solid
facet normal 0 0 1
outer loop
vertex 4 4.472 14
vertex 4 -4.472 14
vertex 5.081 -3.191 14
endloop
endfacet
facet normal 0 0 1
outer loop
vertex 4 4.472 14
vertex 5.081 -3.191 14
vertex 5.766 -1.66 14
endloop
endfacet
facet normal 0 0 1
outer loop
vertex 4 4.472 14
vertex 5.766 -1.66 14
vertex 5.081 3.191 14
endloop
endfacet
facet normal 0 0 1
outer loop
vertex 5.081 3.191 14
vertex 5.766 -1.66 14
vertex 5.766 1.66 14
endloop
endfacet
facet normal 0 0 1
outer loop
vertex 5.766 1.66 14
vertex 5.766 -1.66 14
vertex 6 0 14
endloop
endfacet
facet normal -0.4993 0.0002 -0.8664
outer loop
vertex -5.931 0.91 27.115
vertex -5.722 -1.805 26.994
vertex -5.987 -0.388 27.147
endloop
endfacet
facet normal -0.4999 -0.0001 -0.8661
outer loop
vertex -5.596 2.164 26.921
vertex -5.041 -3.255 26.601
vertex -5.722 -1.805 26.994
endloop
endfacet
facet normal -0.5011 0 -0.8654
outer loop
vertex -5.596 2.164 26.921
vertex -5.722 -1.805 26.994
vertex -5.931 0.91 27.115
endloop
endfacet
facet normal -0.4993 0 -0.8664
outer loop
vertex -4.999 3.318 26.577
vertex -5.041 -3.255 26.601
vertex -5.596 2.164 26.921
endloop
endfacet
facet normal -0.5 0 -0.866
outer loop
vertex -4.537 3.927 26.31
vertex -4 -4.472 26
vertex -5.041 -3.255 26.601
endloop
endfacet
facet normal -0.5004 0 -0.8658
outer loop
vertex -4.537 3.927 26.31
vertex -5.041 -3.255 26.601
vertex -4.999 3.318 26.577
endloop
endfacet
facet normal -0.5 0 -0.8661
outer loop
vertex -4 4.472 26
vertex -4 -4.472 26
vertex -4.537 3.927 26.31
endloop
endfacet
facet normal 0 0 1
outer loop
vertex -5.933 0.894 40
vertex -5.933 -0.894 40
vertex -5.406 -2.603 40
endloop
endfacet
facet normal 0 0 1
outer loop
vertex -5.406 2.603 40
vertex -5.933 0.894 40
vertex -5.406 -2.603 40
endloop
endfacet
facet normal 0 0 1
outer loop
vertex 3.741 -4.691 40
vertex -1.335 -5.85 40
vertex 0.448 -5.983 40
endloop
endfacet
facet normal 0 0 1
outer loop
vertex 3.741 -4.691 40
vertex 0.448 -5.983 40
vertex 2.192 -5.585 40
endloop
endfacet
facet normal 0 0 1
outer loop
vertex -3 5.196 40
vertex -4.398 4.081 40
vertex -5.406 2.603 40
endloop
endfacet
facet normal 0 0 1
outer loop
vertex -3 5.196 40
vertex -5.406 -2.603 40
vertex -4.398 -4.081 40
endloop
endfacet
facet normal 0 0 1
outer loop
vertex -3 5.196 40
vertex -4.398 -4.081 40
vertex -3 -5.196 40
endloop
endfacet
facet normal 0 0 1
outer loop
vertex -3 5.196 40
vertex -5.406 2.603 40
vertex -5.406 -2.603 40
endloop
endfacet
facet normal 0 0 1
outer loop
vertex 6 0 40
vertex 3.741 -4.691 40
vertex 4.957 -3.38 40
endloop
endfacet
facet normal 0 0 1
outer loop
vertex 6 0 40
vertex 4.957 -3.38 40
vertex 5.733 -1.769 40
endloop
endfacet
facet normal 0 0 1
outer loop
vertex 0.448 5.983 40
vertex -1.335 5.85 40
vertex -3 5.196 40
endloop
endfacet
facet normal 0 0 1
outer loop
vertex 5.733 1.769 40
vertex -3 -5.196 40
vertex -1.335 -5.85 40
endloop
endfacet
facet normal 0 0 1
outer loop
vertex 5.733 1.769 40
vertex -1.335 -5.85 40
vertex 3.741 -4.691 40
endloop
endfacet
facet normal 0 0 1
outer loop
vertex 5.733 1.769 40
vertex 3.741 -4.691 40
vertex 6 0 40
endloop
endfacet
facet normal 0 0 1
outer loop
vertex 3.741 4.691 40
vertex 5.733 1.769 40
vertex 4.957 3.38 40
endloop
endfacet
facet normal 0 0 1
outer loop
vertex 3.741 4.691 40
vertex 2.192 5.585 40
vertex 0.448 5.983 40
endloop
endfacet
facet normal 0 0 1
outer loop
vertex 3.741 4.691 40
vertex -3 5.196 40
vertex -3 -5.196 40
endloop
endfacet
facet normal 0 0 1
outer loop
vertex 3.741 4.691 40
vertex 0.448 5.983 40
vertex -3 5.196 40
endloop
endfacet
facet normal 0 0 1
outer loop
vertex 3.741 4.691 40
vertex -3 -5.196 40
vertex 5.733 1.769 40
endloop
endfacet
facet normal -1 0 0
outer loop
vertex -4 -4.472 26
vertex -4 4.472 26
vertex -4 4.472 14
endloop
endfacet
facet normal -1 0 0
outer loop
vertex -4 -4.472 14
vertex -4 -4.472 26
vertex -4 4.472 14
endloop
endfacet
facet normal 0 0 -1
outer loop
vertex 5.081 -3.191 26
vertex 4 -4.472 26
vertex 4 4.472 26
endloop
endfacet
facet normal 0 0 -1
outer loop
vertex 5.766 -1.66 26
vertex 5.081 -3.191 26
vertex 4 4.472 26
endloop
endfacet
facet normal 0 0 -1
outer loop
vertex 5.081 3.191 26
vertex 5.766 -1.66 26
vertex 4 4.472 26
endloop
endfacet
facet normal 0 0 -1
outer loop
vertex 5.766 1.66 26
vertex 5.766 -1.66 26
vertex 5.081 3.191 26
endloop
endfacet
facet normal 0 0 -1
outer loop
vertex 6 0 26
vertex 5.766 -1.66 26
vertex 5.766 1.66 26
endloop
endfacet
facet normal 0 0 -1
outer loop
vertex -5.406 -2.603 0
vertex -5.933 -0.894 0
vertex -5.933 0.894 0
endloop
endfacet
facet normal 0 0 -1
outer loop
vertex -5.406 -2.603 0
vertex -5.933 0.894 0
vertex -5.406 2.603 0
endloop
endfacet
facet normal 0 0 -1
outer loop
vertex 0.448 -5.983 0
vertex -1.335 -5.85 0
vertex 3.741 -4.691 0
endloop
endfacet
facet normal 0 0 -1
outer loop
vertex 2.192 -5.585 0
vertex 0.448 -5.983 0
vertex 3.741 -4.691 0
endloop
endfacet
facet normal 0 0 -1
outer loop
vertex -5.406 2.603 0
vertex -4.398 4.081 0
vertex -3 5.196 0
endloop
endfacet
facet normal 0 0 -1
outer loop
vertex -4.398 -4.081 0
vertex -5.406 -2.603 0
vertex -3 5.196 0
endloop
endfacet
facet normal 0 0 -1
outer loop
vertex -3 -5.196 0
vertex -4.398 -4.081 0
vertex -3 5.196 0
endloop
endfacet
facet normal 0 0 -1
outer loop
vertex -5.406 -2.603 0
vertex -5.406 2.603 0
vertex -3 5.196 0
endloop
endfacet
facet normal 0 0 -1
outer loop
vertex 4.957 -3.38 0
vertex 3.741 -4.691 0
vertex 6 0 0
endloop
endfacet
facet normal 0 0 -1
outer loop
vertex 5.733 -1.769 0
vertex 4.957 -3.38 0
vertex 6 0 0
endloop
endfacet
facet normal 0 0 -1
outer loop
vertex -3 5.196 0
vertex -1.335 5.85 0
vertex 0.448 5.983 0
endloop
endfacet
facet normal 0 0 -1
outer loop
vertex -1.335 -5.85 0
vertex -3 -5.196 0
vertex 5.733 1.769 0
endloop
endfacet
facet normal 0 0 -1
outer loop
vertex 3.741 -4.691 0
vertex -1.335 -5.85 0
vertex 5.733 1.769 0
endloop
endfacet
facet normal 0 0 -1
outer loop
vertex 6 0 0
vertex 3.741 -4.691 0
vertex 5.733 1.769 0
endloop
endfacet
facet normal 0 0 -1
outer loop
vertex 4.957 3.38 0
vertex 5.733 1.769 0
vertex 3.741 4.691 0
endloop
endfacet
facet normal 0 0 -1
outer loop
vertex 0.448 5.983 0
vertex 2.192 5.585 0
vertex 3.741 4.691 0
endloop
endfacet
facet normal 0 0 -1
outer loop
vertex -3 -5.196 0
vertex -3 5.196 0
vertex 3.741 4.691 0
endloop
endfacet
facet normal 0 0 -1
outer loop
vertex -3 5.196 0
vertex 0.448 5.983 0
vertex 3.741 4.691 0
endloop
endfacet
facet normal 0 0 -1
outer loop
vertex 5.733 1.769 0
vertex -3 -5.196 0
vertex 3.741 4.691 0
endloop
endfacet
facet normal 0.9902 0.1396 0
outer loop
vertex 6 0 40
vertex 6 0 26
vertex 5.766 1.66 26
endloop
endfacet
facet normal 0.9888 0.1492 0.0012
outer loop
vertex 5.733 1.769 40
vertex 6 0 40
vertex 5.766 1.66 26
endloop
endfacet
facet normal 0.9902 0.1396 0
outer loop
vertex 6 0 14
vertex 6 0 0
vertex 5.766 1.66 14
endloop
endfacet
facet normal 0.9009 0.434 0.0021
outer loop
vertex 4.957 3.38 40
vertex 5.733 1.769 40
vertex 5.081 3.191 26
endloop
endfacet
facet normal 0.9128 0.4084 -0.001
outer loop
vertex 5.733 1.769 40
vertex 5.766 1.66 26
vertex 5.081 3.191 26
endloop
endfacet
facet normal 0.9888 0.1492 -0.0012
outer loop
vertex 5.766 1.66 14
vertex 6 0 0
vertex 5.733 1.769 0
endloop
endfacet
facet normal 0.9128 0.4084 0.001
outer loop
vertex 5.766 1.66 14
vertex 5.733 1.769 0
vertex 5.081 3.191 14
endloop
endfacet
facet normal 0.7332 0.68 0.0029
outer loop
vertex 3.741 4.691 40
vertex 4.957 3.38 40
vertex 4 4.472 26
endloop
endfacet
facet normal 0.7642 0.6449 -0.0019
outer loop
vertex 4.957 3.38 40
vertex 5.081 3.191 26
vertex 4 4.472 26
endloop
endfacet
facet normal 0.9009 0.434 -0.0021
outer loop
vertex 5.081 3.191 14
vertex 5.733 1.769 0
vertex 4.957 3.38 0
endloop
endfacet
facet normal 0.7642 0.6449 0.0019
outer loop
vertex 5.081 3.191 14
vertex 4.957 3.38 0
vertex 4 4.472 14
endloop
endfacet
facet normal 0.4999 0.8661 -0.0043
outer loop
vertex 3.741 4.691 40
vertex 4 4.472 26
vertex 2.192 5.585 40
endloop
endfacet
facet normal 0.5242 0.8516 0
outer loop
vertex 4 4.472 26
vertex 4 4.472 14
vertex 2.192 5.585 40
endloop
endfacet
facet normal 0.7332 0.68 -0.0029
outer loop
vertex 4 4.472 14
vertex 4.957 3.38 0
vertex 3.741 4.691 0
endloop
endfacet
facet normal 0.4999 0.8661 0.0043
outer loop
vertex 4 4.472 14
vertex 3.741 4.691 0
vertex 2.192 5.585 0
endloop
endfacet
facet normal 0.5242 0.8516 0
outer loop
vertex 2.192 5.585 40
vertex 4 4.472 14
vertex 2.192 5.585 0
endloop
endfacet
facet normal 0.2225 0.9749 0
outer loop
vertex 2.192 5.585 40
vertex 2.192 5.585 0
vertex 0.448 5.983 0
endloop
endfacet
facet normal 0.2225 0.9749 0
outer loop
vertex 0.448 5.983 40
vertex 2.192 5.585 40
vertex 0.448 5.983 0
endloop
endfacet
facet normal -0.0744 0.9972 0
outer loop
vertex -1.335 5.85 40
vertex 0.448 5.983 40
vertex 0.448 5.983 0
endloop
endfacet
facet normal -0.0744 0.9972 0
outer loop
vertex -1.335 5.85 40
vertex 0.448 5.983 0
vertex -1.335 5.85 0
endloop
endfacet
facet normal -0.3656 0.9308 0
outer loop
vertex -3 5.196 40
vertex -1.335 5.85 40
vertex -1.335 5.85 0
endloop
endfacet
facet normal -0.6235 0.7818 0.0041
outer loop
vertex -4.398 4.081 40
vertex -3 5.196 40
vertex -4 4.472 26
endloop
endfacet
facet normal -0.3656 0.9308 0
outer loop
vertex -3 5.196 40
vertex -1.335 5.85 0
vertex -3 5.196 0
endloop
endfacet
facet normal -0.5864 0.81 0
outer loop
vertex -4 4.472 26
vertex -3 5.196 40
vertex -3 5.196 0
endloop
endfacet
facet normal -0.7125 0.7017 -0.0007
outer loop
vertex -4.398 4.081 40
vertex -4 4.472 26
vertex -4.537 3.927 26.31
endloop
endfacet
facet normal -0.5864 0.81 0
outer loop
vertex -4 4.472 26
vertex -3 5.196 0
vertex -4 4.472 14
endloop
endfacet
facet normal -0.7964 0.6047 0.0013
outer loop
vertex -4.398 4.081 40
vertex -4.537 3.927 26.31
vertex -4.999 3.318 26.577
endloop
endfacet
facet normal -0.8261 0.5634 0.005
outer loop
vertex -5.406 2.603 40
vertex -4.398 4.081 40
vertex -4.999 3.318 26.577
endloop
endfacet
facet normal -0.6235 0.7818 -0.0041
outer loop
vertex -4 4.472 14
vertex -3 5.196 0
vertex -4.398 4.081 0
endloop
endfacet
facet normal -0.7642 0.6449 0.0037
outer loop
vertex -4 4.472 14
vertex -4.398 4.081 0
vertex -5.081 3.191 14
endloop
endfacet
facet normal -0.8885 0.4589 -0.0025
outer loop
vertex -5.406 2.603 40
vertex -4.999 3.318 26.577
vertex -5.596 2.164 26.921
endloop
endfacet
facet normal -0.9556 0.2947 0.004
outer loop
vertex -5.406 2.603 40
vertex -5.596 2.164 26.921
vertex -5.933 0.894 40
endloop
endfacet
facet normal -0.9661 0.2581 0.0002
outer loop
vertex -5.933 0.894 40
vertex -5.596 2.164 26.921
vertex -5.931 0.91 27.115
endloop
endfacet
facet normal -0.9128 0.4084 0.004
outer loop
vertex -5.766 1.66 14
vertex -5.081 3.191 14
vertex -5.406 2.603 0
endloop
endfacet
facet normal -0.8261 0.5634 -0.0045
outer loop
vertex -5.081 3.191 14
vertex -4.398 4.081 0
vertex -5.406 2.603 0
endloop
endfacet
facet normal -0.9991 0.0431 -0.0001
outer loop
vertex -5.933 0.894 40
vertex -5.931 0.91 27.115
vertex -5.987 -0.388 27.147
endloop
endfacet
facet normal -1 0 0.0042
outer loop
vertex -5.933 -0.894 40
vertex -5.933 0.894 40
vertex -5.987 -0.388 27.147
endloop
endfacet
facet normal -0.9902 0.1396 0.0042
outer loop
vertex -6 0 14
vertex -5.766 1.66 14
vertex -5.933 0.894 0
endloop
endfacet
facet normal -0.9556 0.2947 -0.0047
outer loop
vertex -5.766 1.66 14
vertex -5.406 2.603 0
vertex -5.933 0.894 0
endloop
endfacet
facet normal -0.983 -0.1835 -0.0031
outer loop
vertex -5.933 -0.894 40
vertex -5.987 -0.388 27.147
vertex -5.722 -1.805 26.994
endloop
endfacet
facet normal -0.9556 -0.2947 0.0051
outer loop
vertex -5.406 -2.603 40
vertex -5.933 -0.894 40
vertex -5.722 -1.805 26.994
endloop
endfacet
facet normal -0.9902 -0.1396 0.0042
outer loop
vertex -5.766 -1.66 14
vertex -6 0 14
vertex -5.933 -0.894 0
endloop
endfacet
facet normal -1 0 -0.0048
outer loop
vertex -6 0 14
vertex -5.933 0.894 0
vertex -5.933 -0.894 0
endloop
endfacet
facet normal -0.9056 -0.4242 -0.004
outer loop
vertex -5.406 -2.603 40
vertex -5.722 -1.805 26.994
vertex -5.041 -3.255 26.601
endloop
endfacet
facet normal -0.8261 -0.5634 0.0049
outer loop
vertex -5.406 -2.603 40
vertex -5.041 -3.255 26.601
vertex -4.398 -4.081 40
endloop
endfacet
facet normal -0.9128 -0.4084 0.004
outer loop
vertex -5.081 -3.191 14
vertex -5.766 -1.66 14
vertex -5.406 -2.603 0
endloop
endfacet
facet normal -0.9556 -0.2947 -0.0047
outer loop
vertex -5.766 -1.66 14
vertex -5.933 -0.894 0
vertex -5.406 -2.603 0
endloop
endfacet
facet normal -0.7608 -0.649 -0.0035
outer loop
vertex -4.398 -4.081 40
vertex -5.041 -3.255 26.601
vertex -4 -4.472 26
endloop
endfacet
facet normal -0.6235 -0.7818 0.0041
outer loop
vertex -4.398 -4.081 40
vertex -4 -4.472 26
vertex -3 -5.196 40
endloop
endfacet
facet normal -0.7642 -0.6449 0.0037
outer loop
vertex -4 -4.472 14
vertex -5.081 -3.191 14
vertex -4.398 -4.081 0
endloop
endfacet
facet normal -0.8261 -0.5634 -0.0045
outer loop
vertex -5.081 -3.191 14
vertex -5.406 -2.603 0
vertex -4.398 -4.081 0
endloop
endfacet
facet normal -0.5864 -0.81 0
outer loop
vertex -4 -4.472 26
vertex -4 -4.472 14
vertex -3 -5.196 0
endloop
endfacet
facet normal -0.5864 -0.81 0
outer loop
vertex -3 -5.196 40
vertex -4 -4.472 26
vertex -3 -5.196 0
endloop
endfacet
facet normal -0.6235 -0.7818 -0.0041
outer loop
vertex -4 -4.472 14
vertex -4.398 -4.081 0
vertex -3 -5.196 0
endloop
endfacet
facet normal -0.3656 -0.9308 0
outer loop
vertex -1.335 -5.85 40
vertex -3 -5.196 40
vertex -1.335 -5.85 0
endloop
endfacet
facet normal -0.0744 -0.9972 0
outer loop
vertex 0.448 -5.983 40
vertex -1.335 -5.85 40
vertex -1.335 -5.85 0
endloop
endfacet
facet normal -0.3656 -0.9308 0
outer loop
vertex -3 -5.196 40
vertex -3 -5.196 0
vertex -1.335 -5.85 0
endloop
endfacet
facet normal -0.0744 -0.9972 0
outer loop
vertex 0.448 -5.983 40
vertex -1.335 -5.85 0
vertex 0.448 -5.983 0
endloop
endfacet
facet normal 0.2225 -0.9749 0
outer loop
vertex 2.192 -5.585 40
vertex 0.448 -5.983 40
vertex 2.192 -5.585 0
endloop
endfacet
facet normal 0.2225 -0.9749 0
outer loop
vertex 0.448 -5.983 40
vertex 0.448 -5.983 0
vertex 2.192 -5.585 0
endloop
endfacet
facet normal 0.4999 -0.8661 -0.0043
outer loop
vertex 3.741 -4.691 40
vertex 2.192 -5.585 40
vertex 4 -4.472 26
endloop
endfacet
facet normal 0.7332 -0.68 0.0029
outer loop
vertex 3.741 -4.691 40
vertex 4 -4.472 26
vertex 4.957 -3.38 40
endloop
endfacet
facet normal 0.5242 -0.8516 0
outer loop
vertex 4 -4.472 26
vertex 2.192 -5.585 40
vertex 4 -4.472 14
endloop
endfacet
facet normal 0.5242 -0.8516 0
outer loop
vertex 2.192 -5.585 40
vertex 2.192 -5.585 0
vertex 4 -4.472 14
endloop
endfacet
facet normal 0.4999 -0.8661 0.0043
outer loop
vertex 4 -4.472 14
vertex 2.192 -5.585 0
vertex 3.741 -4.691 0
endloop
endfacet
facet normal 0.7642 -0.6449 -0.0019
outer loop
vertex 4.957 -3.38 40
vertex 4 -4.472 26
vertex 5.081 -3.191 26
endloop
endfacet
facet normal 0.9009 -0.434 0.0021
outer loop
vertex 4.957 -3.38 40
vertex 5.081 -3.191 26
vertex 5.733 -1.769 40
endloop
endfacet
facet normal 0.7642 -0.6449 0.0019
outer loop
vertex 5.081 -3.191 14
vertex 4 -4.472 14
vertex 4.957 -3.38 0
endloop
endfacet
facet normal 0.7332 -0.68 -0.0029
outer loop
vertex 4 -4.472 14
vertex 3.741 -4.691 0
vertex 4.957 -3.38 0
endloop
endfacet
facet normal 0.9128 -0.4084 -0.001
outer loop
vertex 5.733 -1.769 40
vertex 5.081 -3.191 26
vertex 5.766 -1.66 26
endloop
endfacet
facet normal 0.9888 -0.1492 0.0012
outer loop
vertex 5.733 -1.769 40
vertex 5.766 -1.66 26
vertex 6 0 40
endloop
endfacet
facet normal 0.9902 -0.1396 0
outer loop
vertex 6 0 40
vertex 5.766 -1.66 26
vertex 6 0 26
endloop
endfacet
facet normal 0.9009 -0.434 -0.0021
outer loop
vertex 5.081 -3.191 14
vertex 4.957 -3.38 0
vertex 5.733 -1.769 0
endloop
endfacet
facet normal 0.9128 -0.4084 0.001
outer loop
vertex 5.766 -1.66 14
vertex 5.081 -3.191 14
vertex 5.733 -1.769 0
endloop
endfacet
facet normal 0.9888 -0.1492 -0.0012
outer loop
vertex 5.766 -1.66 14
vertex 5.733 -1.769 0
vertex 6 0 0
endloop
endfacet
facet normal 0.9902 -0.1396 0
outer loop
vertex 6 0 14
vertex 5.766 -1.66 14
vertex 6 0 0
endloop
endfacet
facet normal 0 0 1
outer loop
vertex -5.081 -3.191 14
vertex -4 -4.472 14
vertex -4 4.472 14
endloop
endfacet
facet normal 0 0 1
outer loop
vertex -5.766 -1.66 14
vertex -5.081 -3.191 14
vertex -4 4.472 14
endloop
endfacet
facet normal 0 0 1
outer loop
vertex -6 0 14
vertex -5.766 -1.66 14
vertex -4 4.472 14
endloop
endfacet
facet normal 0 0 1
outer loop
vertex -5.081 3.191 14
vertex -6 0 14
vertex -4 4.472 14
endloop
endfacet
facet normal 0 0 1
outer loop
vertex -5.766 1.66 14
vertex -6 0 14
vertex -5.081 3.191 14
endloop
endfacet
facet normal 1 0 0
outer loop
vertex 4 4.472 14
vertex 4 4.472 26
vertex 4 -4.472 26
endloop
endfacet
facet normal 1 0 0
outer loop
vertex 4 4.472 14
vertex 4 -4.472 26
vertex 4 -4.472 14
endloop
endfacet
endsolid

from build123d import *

# Parameters (mm, degrees)
SKETCH_1_R          = 6
EXTRUDE_1_DEPTH     = 40
SKETCH_3_W          = 12
SKETCH_3_H          = 9
CUT_EXTRUDE_1_DEPTH = 40
DRAFT_3_ANGLE       = 30


with BuildPart() as part:
    # 草图1 → 凸台-拉伸1 (new body)
    with BuildSketch(Plane.XY):
        Circle(SKETCH_1_R)
    extrude(amount=EXTRUDE_1_DEPTH)

    # 草图3 → 切除-拉伸1 (cut)
    with BuildSketch(Plane(origin=(4, 0, 0), x_dir=(0, 0, -1), z_dir=(1, 0, 0))):
        with Locations((-20, 0)):
            Rectangle(SKETCH_3_W, SKETCH_3_H)
    cut_extrude_1 = extrude(amount=CUT_EXTRUDE_1_DEPTH, mode=Mode.SUBTRACT)

    # 镜向1: 切除-拉伸1 across plane
    add(cut_extrude_1.mirror(Plane(origin=(0, 0, 0), x_dir=(0, 0, 1), z_dir=(1, 0, 0))), mode=Mode.SUBTRACT)

    # 拔模3
    draft_3_faces = [part.faces().sort_by_distance(p)[0] for p in [
        (-4.812657334, 0, 26),
    ]]
    draft(draft_3_faces, Plane(origin=(-4, 0, 0), x_dir=(0, 0, -1), z_dir=(-1, 0, 0)), DRAFT_3_ANGLE)


solid = part.part
